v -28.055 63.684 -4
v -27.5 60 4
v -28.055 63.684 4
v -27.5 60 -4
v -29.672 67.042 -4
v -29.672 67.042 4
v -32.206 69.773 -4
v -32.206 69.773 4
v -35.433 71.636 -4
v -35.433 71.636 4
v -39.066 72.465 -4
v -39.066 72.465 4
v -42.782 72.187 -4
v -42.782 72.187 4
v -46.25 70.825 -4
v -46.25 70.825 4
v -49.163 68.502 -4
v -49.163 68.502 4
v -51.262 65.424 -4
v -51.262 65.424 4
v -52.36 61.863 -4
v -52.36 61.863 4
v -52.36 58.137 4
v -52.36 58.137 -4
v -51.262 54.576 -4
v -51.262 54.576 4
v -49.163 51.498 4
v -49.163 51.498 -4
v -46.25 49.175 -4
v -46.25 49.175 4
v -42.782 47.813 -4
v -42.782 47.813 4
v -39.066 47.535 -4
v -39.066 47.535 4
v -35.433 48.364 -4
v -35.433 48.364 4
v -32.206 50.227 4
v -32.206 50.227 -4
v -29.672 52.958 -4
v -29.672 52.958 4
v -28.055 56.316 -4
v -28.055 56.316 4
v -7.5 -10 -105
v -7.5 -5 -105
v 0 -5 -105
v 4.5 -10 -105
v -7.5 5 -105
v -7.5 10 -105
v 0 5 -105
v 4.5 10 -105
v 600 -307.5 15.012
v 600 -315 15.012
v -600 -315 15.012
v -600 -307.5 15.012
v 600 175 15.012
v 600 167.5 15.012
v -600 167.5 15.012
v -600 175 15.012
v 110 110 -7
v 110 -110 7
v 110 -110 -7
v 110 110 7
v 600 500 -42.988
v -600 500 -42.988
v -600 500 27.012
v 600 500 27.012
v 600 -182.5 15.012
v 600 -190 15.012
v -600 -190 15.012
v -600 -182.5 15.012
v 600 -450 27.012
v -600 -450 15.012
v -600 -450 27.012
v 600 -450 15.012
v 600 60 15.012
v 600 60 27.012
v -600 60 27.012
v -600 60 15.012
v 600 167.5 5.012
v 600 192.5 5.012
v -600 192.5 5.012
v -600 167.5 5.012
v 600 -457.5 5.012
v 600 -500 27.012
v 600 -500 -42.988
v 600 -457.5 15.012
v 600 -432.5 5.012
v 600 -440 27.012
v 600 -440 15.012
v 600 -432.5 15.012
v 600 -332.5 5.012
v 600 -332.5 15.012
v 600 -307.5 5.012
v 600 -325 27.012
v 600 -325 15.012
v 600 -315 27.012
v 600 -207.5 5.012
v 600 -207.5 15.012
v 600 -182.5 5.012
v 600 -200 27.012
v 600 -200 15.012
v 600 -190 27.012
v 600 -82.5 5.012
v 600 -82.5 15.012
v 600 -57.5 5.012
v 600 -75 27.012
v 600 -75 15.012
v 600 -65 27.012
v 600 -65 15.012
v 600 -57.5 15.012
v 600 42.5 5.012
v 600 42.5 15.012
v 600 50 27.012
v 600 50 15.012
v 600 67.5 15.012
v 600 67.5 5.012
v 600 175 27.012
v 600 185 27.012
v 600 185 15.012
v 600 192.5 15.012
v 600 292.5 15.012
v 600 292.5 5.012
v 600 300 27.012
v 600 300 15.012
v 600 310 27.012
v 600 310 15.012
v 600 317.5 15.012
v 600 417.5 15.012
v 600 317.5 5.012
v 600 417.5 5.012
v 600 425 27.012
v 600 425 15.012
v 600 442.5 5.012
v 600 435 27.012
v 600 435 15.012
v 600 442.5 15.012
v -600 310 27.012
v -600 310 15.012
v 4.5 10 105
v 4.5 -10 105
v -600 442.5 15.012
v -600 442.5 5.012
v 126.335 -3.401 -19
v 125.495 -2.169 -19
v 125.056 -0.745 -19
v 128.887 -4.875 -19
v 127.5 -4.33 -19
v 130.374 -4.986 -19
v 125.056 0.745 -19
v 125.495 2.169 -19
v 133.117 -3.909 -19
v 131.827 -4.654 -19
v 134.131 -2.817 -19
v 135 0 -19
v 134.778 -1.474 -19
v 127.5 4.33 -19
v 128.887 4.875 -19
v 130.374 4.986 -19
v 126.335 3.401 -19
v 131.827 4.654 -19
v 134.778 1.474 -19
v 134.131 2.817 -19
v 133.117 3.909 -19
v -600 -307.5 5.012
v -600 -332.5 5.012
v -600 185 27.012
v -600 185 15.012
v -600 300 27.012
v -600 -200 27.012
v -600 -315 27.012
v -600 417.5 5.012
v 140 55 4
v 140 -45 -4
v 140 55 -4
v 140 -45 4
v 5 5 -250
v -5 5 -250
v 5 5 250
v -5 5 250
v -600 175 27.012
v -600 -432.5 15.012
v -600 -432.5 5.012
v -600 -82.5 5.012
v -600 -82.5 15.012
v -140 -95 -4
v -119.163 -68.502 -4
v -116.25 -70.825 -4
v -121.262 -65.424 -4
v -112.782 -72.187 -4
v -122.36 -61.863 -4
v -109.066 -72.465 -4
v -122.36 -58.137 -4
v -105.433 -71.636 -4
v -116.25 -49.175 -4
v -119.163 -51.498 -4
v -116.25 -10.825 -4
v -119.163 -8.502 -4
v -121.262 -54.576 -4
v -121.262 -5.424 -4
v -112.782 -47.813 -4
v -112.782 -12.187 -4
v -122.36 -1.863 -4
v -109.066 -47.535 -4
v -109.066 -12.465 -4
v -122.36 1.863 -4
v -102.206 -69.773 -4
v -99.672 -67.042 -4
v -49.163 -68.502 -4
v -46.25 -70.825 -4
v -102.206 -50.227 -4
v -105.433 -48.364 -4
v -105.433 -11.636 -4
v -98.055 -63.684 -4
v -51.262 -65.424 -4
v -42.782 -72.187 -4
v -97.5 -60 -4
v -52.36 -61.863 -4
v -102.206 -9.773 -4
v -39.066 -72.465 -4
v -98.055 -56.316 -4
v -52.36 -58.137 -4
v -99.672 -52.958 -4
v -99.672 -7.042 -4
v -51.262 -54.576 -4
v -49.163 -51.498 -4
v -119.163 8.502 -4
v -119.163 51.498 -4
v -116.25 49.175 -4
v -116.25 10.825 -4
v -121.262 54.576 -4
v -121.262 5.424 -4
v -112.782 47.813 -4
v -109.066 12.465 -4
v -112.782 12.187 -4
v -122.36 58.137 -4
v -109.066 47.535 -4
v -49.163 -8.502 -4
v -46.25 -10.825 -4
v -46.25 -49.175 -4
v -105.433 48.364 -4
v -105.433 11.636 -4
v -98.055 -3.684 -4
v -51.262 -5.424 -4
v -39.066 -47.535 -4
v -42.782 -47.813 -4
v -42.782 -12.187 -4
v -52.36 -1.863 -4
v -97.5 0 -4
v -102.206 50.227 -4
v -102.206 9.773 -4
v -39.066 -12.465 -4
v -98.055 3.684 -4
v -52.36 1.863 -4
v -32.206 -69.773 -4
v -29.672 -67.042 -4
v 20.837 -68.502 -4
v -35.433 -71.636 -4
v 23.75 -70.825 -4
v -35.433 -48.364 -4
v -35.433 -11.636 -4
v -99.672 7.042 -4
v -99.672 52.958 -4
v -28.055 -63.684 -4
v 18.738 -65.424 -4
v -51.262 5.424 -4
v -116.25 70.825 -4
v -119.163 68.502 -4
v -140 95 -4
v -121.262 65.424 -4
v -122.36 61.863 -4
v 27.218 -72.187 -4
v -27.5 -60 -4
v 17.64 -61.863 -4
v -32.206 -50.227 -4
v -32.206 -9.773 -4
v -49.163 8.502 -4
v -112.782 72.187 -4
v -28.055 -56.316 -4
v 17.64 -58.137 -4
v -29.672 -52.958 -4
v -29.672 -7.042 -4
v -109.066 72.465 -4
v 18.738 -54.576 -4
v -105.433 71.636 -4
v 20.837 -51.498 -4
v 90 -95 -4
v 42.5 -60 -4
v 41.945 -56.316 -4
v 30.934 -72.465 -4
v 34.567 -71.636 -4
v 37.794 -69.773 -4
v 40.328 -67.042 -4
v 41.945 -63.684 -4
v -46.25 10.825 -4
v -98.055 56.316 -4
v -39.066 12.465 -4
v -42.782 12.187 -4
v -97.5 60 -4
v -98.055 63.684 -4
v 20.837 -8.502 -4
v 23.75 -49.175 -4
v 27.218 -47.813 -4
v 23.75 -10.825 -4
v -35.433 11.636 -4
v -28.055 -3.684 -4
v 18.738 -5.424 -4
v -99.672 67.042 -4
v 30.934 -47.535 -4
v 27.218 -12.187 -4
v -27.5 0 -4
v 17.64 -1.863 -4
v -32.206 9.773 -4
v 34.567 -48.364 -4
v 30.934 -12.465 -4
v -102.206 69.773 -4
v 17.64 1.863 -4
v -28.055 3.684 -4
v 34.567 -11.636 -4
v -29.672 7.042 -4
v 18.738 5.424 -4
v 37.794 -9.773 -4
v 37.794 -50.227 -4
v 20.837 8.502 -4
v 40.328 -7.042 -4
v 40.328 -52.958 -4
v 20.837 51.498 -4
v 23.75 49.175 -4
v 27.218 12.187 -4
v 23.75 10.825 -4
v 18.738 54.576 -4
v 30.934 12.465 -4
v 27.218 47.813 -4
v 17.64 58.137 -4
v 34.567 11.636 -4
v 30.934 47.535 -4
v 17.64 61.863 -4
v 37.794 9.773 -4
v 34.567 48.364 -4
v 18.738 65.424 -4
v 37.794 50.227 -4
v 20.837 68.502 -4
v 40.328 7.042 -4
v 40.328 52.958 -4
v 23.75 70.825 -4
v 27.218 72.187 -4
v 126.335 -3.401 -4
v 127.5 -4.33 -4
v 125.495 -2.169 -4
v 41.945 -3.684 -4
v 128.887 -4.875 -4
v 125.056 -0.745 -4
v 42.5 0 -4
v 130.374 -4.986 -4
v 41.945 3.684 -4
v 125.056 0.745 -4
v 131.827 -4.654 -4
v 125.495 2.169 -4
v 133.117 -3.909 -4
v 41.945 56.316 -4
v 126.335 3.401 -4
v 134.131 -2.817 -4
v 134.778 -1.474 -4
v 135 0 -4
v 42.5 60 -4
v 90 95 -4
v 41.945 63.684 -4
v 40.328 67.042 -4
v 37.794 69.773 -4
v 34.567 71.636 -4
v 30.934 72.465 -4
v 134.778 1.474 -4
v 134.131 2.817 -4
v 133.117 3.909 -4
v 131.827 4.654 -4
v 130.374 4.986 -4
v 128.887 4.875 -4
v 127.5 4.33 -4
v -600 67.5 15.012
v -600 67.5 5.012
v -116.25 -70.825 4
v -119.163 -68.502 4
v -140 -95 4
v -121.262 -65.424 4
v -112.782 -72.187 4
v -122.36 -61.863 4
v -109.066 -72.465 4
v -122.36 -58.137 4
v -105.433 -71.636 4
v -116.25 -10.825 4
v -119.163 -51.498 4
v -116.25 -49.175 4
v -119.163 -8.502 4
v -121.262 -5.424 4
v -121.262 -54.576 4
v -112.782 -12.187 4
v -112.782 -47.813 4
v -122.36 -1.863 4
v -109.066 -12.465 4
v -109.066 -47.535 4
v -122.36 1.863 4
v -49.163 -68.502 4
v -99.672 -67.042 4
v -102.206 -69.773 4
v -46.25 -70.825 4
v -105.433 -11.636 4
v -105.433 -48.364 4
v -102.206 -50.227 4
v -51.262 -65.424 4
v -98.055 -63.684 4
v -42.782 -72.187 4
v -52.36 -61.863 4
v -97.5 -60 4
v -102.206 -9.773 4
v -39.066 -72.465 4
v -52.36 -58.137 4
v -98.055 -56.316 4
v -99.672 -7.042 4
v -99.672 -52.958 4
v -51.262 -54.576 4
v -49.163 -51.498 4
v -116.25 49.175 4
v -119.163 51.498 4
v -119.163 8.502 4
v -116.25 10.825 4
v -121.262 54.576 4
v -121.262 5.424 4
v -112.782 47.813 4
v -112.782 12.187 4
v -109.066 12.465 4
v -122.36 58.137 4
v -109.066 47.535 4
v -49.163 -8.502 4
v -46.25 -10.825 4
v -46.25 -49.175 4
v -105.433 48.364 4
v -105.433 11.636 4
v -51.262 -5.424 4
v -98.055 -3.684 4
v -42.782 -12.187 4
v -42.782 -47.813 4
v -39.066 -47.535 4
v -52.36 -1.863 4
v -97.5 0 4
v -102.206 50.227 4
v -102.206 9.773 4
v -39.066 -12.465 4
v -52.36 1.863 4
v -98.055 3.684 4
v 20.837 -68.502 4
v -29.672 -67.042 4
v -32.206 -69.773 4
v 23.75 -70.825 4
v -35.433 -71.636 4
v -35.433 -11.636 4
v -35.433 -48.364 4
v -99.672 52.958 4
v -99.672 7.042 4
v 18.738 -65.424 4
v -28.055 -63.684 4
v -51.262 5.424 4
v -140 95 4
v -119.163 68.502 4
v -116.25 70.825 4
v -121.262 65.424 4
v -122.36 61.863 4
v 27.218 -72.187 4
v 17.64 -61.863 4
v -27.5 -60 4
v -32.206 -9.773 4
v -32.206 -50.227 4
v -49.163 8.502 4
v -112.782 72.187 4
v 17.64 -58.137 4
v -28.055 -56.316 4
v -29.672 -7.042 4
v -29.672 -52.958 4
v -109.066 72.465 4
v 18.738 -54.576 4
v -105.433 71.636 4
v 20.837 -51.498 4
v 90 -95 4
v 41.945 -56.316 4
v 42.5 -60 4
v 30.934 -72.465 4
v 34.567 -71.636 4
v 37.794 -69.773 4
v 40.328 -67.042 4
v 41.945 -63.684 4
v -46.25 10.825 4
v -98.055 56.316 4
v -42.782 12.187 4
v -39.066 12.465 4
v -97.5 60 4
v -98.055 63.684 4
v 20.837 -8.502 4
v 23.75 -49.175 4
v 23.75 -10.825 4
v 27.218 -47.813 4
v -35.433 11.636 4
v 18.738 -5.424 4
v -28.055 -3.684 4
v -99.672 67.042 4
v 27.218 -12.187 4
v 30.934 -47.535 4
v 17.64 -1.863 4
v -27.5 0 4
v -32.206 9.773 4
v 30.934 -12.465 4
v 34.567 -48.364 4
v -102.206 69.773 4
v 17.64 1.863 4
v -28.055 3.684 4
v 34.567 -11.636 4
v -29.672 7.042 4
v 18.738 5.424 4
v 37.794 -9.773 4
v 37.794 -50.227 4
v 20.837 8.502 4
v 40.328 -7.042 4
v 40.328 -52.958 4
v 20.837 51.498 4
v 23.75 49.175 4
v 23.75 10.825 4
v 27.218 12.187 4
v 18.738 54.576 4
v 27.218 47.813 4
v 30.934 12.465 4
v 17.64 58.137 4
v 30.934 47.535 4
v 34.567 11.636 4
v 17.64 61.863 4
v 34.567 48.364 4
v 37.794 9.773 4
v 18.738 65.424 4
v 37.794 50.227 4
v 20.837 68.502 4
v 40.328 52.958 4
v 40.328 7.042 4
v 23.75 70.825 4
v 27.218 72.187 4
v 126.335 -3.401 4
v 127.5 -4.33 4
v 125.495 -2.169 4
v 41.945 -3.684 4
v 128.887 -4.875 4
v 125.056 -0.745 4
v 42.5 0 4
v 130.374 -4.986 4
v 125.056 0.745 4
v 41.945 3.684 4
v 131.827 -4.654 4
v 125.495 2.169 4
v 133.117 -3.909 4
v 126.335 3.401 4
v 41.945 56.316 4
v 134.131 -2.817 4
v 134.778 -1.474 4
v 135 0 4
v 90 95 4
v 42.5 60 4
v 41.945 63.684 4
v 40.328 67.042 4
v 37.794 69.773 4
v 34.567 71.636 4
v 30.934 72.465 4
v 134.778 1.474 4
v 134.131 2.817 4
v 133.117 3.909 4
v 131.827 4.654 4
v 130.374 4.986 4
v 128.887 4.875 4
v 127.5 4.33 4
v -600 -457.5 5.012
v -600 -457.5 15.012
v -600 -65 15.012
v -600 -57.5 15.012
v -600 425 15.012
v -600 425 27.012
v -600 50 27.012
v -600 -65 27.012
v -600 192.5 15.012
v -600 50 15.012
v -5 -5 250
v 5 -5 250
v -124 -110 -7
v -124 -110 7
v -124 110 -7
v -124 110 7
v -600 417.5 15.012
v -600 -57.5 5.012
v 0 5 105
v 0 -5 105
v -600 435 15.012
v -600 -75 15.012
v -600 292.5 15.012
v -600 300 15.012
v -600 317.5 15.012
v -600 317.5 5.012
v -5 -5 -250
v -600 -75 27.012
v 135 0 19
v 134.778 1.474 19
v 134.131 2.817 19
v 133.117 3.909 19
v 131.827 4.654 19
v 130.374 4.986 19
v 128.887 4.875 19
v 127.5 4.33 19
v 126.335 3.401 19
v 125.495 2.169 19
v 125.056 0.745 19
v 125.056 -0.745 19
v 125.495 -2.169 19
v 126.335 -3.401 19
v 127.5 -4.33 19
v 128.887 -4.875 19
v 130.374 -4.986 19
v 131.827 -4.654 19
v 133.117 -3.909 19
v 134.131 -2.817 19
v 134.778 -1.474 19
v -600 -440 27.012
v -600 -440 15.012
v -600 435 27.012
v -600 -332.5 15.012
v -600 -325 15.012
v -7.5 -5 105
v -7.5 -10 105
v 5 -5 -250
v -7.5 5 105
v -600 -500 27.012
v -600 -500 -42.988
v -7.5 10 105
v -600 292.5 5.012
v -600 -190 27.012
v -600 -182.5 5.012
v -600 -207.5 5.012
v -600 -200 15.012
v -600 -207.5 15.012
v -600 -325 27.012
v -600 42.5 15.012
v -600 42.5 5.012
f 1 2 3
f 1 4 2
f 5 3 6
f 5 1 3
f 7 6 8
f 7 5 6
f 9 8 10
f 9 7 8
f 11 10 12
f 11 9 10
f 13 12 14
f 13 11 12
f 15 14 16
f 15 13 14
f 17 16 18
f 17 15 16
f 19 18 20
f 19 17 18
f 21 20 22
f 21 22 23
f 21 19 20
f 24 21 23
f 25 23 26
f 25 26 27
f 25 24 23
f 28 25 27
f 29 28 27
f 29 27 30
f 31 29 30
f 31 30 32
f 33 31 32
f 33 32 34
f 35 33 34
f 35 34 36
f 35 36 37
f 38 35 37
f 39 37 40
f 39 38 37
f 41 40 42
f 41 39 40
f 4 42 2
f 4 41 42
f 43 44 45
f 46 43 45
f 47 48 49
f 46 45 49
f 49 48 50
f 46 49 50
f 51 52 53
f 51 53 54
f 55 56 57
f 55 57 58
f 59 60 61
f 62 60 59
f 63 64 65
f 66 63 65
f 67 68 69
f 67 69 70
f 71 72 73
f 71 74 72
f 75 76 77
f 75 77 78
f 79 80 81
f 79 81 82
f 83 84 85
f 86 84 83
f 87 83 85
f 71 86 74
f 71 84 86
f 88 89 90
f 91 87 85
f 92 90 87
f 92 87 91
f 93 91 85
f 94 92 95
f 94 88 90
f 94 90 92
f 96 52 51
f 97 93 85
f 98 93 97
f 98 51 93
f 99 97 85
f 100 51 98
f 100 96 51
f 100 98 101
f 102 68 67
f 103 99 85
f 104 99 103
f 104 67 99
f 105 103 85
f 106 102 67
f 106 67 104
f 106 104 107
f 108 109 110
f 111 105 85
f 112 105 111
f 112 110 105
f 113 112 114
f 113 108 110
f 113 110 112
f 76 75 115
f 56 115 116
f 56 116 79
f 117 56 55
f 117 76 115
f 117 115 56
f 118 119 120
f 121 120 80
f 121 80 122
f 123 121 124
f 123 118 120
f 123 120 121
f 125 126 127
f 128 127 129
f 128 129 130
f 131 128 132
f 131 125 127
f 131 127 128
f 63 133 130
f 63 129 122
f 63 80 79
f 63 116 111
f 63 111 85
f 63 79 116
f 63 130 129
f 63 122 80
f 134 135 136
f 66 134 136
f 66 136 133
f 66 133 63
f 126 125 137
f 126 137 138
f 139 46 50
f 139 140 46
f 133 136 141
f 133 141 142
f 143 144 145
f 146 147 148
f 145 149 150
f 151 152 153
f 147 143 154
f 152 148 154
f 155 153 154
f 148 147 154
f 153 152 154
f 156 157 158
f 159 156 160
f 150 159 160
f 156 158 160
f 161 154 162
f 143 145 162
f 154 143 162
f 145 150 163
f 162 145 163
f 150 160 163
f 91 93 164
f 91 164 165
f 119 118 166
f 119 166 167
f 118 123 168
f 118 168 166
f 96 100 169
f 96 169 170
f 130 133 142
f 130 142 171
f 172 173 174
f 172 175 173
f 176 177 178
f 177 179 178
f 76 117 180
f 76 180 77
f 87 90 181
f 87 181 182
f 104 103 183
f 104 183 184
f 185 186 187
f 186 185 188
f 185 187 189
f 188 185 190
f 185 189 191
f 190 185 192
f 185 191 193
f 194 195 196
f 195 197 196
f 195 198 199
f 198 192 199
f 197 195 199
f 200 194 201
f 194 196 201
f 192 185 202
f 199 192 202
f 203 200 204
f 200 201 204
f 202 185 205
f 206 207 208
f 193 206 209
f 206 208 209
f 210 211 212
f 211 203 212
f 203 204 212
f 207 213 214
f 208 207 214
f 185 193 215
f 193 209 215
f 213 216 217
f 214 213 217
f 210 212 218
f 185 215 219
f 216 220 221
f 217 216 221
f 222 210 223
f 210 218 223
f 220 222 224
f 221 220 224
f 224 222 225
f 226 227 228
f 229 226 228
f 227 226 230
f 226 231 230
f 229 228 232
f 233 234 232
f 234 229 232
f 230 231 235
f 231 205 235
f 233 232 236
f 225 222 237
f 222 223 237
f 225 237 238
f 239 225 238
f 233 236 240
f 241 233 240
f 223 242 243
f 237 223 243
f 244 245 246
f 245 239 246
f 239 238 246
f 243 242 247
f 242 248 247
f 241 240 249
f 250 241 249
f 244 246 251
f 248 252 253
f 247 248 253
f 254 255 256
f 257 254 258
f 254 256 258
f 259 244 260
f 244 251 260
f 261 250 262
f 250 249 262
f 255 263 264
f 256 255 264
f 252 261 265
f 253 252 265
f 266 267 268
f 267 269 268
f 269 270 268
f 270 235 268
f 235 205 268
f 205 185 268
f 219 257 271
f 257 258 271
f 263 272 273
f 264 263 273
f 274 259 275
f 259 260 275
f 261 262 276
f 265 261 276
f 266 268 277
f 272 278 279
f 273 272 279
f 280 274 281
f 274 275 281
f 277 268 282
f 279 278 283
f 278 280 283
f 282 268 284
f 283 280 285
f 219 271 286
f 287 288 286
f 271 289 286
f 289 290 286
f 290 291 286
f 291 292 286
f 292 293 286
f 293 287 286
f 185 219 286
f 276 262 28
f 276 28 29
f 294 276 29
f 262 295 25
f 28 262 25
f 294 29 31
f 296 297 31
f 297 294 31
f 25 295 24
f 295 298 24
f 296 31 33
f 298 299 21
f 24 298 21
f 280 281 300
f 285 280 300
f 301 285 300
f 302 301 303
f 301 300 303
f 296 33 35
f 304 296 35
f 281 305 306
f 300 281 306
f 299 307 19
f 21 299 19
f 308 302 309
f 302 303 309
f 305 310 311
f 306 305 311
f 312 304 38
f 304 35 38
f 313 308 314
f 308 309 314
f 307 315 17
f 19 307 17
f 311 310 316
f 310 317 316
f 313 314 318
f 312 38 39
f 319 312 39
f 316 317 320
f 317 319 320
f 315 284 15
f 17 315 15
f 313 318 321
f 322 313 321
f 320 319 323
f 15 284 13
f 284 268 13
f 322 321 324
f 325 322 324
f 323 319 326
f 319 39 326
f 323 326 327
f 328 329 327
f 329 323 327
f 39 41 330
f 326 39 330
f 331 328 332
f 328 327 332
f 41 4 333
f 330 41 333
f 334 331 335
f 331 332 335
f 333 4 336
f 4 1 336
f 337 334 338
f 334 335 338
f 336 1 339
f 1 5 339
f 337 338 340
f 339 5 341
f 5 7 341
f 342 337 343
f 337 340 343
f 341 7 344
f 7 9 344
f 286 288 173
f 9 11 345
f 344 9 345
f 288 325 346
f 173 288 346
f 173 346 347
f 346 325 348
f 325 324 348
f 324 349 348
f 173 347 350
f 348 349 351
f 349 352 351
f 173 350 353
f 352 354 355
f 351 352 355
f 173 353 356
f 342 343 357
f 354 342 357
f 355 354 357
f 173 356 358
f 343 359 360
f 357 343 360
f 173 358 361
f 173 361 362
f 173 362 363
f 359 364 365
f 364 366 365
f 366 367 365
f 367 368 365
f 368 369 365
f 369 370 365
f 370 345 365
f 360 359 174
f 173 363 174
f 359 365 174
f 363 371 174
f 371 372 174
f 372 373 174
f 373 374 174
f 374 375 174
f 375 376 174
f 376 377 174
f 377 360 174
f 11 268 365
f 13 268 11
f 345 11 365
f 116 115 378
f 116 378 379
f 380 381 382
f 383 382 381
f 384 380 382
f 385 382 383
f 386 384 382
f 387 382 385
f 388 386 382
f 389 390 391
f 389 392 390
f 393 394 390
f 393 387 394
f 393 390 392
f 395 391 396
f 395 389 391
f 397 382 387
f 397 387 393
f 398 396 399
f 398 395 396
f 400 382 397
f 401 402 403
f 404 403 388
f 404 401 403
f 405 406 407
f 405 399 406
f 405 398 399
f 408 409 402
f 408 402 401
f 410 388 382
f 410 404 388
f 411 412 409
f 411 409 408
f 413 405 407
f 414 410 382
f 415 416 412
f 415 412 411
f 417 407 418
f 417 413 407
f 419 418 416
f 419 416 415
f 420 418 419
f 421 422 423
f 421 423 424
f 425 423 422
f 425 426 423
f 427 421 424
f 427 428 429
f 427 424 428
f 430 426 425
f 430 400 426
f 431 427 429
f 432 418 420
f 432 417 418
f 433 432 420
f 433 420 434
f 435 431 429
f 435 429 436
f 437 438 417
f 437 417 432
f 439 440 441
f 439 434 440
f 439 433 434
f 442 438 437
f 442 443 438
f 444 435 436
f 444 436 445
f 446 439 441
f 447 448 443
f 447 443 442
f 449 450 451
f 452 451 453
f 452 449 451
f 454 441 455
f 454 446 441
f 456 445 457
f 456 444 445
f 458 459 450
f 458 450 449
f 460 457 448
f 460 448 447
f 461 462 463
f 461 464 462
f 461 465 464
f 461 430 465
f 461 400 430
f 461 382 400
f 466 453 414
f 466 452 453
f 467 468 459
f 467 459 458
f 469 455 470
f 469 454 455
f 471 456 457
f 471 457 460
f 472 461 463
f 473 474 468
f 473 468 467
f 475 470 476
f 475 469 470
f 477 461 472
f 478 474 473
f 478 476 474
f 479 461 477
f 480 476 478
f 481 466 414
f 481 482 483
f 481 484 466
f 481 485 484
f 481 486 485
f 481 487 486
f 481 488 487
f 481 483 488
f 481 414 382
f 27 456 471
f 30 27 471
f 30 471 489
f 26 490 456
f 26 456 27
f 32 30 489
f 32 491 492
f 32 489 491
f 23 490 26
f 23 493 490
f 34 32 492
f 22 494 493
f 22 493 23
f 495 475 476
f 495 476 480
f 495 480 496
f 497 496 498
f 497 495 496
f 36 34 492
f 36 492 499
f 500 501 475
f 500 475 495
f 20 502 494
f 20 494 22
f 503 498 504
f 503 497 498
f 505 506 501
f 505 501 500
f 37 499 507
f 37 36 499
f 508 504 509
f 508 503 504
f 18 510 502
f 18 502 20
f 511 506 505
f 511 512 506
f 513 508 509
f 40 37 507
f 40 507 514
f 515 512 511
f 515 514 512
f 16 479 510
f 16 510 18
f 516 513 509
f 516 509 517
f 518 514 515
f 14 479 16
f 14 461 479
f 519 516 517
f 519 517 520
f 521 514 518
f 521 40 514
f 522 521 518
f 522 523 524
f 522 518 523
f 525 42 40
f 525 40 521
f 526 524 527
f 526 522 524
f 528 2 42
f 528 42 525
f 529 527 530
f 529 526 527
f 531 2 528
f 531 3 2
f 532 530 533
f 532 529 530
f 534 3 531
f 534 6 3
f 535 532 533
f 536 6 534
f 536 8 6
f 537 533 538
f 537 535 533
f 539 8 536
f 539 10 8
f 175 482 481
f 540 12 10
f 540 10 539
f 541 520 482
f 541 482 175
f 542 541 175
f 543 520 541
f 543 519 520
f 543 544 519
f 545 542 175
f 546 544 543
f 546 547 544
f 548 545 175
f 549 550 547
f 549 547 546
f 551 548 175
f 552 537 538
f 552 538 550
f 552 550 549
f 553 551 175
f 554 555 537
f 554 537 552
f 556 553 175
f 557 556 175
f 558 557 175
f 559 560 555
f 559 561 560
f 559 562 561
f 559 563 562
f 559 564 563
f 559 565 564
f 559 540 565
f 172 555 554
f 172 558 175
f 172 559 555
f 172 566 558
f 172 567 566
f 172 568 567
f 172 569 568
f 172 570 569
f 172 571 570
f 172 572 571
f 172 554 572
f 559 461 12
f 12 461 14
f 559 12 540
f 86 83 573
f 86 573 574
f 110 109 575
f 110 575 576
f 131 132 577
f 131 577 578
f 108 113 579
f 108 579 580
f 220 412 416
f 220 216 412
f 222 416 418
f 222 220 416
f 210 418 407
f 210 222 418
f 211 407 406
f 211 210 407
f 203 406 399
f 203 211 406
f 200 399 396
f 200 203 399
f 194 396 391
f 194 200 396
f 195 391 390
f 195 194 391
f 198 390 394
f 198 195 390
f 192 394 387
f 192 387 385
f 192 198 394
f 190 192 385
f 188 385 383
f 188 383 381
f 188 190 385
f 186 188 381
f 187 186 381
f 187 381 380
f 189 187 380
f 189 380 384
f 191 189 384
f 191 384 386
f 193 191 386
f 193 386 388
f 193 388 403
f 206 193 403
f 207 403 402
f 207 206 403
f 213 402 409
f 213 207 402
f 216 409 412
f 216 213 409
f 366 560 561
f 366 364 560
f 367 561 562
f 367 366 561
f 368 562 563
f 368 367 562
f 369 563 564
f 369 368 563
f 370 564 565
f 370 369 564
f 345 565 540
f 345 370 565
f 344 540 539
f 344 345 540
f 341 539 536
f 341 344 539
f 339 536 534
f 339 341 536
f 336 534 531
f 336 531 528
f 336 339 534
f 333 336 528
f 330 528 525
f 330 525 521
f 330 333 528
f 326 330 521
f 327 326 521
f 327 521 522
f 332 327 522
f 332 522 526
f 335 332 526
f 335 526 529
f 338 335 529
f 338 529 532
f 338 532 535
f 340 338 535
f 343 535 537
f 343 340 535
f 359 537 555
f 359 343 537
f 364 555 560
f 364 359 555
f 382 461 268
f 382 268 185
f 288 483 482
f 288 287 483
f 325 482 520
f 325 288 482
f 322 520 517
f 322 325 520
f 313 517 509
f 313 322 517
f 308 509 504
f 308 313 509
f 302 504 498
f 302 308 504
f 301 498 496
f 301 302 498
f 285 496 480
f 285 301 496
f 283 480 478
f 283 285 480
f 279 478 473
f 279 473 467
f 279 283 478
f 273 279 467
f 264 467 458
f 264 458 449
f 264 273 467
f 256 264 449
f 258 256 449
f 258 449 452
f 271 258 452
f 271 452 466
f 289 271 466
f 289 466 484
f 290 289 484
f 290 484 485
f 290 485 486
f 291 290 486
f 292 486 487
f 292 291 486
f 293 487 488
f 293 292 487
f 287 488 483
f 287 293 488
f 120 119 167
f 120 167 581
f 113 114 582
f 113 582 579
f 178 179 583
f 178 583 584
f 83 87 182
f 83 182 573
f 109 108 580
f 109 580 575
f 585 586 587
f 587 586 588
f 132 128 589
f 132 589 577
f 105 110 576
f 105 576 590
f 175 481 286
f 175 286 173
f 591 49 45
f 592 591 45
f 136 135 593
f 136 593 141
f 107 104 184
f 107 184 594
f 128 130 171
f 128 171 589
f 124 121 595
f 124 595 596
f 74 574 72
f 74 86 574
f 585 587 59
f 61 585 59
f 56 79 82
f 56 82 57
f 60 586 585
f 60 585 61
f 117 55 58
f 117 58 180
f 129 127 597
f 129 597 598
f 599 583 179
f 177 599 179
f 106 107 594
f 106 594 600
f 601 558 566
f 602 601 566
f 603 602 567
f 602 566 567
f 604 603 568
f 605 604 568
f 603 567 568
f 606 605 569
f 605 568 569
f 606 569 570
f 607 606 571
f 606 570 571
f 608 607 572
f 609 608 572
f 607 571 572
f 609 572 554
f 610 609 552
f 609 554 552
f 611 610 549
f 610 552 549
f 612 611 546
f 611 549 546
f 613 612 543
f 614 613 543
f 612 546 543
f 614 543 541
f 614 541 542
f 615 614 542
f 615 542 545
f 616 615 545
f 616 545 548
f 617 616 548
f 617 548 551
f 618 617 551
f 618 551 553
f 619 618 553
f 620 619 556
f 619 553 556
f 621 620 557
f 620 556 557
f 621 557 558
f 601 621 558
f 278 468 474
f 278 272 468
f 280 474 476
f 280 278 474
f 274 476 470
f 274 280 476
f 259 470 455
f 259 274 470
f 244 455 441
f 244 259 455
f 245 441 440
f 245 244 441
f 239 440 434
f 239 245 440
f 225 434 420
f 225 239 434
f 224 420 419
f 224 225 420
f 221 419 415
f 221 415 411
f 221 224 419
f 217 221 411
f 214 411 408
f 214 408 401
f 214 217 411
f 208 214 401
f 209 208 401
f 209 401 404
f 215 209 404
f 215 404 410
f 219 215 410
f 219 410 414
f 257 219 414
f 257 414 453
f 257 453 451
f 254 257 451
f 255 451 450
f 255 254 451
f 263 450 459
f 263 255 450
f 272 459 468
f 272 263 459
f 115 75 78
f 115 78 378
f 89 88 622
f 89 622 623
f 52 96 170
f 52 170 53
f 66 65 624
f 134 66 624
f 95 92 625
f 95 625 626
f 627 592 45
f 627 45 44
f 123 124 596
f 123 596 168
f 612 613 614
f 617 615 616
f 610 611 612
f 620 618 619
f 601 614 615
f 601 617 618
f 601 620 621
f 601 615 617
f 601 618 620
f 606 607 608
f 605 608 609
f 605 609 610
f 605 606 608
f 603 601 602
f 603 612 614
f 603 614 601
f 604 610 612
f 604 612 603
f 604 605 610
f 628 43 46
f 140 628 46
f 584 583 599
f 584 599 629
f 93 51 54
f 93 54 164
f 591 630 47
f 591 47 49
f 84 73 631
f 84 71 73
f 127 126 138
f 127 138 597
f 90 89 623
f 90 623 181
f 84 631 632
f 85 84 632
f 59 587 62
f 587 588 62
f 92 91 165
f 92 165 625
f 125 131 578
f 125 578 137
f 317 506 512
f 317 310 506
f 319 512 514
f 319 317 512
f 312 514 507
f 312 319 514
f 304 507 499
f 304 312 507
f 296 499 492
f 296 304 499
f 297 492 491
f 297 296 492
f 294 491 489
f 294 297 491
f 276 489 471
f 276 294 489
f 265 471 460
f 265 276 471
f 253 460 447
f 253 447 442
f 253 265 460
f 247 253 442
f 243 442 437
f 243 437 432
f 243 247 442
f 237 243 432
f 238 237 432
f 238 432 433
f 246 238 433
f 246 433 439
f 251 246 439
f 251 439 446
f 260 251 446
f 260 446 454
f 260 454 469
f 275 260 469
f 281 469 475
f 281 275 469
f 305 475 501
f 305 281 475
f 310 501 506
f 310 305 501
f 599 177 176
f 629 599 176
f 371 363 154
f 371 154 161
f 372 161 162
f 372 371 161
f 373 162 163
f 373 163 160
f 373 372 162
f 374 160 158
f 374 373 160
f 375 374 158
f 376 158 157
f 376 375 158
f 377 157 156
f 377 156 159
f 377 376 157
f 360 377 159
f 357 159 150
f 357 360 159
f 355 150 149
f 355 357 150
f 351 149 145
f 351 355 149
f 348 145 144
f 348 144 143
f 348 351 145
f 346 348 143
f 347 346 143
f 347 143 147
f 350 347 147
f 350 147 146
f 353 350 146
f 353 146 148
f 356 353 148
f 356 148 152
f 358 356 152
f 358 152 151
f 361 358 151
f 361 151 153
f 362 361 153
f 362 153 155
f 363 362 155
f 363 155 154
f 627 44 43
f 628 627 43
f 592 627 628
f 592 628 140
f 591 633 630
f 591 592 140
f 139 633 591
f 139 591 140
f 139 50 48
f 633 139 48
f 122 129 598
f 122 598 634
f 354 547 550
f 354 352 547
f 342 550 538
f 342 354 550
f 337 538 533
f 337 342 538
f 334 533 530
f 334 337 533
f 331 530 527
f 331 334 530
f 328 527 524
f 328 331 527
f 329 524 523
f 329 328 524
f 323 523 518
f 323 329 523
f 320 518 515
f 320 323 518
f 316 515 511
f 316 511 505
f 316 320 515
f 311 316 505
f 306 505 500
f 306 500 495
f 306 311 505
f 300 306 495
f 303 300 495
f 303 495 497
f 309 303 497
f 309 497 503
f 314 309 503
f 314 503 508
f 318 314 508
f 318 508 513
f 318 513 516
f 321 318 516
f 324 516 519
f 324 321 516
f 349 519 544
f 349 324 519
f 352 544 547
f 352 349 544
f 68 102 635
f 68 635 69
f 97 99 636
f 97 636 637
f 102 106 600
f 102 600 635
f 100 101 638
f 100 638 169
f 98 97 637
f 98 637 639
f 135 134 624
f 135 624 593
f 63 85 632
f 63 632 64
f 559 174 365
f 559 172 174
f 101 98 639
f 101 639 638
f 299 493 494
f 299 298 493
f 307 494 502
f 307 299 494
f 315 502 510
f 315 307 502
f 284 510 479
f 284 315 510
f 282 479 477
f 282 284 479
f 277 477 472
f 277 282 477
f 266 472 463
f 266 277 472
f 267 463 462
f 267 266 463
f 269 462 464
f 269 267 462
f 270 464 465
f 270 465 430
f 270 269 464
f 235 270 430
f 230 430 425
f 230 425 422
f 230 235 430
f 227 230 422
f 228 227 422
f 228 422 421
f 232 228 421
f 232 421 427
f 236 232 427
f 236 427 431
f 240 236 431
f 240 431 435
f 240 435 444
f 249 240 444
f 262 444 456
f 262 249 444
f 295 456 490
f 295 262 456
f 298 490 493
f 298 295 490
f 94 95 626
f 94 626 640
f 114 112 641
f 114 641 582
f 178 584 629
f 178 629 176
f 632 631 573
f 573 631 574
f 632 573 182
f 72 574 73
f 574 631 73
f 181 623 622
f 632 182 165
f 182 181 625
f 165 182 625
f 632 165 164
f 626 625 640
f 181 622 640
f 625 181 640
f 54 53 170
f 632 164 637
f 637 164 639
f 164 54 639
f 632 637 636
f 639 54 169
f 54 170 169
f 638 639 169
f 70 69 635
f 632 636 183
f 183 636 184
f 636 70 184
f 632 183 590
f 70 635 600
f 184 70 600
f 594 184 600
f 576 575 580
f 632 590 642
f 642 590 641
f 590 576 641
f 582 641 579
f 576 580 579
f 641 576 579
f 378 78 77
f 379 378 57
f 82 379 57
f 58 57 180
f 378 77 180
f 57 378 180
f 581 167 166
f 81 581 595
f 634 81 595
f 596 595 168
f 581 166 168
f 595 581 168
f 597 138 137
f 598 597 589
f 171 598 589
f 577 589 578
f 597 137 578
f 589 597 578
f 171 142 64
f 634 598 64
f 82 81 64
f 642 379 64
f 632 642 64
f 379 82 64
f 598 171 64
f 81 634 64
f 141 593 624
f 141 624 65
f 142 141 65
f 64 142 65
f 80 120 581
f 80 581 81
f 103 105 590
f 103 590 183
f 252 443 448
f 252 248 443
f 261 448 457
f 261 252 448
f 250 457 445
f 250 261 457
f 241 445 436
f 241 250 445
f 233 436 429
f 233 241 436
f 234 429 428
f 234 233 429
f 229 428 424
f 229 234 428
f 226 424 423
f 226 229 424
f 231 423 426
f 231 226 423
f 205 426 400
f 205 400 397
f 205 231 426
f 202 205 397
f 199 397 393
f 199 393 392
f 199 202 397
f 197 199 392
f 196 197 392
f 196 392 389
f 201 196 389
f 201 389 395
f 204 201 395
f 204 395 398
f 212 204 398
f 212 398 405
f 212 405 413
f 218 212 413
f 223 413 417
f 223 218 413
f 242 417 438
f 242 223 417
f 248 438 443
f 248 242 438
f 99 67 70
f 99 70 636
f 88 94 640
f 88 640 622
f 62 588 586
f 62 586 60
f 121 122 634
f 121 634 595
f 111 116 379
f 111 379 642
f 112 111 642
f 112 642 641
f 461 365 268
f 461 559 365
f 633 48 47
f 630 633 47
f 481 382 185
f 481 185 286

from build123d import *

# Parameters (mm, degrees)
F1_DEPTH       = 600
F1_DEPTH_BACK  = 600
F2_R           = 12.5
F2_R_2         = 5
F3_DEPTH       = 4
F3_DEPTH_BACK  = 4
F4_R           = 5
F5_DEPTH       = 15
F5_DEPTH_BACK  = 23
F6_W           = 10
F6_H           = 10
F7_DEPTH       = 250
F7_DEPTH_BACK  = 250
F9_DEPTH       = 105
F9_DEPTH_BACK  = 105
F10_W          = 234
F10_H          = 220
F11_DEPTH      = 7
F11_DEPTH_BACK = 7


with BuildPart() as f1:
    # F0 (on Right) → F1 (new body, two sides)
    with BuildSketch(Plane.YZ) as f1_sk:
        Polygon((-450, 27.012093), (-500, 27.012093), (-500, -42.987907), (500, -42.987907), (500, 27.012093), (435, 27.012093), (435, 15.012093), (442.5, 15.012093), (442.5, 5.012093), (417.5, 5.012093), (417.5, 15.012093), (425, 15.012093), (425, 27.012093), (375, 27.012093), (310, 27.012093), (310, 15.012093), (317.5, 15.012093), (317.5, 5.012093), (292.5, 5.012093), (292.5, 15.012093), (300, 15.012093), (300, 27.012093), (250, 27.012093), (185, 27.012093), (185, 15.012093), (192.5, 15.012093), (192.5, 5.012093), (167.5, 5.012093), (167.5, 15.012093), (175, 15.012093), (175, 27.012093), (125, 27.012093), (60, 27.012093), (60, 15.012093), (67.5, 15.012093), (67.5, 5.012093), (42.5, 5.012093), (42.5, 15.012093), (50, 15.012093), (50, 27.012093), (0, 27.012093), (-65, 27.012093), (-65, 15.012093), (-57.5, 15.012093), (-57.5, 5.012093), (-82.5, 5.012093), (-82.5, 15.012093), (-75, 15.012093), (-75, 27.012093), (-125, 27.012093), (-190, 27.012093), (-190, 15.012093), (-182.5, 15.012093), (-182.5, 5.012093), (-207.5, 5.012093), (-207.5, 15.012093), (-200, 15.012093), (-200, 27.012093), (-250, 27.012093), (-315, 27.012093), (-315, 15.012093), (-307.5, 15.012093), (-307.5, 5.012093), (-332.5, 5.012093), (-332.5, 15.012093), (-325, 15.012093), (-325, 27.012093), (-375, 27.012093), (-440, 27.012093), (-440, 15.012093), (-432.5, 15.012093), (-432.5, 5.012093), (-457.5, 5.012093), (-457.5, 15.012093), (-450, 15.012093), align=None)
    extrude(amount=F1_DEPTH)
    extrude(f1_sk.sketch, amount=-F1_DEPTH_BACK)


with BuildPart() as f3:
    # F2 (on Top) → F3 (new body, two sides)
    with BuildSketch(Plane.XY) as f3_sk:
        Polygon((90, 95), (-140, 95), (-140, -95), (90, -95), (140, -45), (140, 55), align=None)
        with Locations((-110, -60)):
            Circle(F2_R, mode=Mode.SUBTRACT)
        with Locations((-40, -60)):
            Circle(F2_R, mode=Mode.SUBTRACT)
        with Locations((30, -60)):
            Circle(F2_R, mode=Mode.SUBTRACT)
        with Locations((-110, 0)):
            Circle(F2_R, mode=Mode.SUBTRACT)
        with Locations((-40, 0)):
            Circle(F2_R, mode=Mode.SUBTRACT)
        with Locations((-110, 60)):
            Circle(F2_R, mode=Mode.SUBTRACT)
        with Locations((-40, 60)):
            Circle(F2_R, mode=Mode.SUBTRACT)
        with Locations((30, 0)):
            Circle(F2_R, mode=Mode.SUBTRACT)
        with Locations((130, 0)):
            Circle(F2_R_2, mode=Mode.SUBTRACT)
        with Locations((30, 60)):
            Circle(F2_R, mode=Mode.SUBTRACT)
    extrude(amount=F3_DEPTH)
    extrude(f3_sk.sketch, amount=-F3_DEPTH_BACK)

    # F4 (on face) → F5 (join, two sides)
    with BuildSketch(Plane.XY.offset(4)) as f5_sk:
        with Locations((130, 0)):
            Circle(F4_R)
    extrude(amount=F5_DEPTH)
    extrude(f5_sk.sketch, amount=-F5_DEPTH_BACK)


with BuildPart() as f7:
    # F6 (on Top) → F7 (new body, two sides)
    with BuildSketch(Plane.XY) as f7_sk:
        Rectangle(F6_W, F6_H)
    extrude(amount=F7_DEPTH)
    extrude(f7_sk.sketch, amount=-F7_DEPTH_BACK)


with BuildPart() as f9:
    # F8 (on Top) → F9 (new body, two sides)
    with BuildSketch(Plane.XY) as f9_sk:
        Polygon((4.5, 10), (-7.5, 10), (-7.5, 5), (0, 5), (0, -5), (-7.5, -5), (-7.5, -10), (4.5, -10), align=None)
    extrude(amount=F9_DEPTH)
    extrude(f9_sk.sketch, amount=-F9_DEPTH_BACK)


with BuildPart() as f11:
    # F10 (on Top) → F11 (new body, two sides)
    with BuildSketch(Plane.XY) as f11_sk:
        with Locations((-7, 0)):
            Rectangle(F10_W, F10_H)
    extrude(amount=F11_DEPTH)
    extrude(f11_sk.sketch, amount=-F11_DEPTH_BACK)


solid = Compound([f1.part, f3.part, f7.part, f9.part, f11.part])
